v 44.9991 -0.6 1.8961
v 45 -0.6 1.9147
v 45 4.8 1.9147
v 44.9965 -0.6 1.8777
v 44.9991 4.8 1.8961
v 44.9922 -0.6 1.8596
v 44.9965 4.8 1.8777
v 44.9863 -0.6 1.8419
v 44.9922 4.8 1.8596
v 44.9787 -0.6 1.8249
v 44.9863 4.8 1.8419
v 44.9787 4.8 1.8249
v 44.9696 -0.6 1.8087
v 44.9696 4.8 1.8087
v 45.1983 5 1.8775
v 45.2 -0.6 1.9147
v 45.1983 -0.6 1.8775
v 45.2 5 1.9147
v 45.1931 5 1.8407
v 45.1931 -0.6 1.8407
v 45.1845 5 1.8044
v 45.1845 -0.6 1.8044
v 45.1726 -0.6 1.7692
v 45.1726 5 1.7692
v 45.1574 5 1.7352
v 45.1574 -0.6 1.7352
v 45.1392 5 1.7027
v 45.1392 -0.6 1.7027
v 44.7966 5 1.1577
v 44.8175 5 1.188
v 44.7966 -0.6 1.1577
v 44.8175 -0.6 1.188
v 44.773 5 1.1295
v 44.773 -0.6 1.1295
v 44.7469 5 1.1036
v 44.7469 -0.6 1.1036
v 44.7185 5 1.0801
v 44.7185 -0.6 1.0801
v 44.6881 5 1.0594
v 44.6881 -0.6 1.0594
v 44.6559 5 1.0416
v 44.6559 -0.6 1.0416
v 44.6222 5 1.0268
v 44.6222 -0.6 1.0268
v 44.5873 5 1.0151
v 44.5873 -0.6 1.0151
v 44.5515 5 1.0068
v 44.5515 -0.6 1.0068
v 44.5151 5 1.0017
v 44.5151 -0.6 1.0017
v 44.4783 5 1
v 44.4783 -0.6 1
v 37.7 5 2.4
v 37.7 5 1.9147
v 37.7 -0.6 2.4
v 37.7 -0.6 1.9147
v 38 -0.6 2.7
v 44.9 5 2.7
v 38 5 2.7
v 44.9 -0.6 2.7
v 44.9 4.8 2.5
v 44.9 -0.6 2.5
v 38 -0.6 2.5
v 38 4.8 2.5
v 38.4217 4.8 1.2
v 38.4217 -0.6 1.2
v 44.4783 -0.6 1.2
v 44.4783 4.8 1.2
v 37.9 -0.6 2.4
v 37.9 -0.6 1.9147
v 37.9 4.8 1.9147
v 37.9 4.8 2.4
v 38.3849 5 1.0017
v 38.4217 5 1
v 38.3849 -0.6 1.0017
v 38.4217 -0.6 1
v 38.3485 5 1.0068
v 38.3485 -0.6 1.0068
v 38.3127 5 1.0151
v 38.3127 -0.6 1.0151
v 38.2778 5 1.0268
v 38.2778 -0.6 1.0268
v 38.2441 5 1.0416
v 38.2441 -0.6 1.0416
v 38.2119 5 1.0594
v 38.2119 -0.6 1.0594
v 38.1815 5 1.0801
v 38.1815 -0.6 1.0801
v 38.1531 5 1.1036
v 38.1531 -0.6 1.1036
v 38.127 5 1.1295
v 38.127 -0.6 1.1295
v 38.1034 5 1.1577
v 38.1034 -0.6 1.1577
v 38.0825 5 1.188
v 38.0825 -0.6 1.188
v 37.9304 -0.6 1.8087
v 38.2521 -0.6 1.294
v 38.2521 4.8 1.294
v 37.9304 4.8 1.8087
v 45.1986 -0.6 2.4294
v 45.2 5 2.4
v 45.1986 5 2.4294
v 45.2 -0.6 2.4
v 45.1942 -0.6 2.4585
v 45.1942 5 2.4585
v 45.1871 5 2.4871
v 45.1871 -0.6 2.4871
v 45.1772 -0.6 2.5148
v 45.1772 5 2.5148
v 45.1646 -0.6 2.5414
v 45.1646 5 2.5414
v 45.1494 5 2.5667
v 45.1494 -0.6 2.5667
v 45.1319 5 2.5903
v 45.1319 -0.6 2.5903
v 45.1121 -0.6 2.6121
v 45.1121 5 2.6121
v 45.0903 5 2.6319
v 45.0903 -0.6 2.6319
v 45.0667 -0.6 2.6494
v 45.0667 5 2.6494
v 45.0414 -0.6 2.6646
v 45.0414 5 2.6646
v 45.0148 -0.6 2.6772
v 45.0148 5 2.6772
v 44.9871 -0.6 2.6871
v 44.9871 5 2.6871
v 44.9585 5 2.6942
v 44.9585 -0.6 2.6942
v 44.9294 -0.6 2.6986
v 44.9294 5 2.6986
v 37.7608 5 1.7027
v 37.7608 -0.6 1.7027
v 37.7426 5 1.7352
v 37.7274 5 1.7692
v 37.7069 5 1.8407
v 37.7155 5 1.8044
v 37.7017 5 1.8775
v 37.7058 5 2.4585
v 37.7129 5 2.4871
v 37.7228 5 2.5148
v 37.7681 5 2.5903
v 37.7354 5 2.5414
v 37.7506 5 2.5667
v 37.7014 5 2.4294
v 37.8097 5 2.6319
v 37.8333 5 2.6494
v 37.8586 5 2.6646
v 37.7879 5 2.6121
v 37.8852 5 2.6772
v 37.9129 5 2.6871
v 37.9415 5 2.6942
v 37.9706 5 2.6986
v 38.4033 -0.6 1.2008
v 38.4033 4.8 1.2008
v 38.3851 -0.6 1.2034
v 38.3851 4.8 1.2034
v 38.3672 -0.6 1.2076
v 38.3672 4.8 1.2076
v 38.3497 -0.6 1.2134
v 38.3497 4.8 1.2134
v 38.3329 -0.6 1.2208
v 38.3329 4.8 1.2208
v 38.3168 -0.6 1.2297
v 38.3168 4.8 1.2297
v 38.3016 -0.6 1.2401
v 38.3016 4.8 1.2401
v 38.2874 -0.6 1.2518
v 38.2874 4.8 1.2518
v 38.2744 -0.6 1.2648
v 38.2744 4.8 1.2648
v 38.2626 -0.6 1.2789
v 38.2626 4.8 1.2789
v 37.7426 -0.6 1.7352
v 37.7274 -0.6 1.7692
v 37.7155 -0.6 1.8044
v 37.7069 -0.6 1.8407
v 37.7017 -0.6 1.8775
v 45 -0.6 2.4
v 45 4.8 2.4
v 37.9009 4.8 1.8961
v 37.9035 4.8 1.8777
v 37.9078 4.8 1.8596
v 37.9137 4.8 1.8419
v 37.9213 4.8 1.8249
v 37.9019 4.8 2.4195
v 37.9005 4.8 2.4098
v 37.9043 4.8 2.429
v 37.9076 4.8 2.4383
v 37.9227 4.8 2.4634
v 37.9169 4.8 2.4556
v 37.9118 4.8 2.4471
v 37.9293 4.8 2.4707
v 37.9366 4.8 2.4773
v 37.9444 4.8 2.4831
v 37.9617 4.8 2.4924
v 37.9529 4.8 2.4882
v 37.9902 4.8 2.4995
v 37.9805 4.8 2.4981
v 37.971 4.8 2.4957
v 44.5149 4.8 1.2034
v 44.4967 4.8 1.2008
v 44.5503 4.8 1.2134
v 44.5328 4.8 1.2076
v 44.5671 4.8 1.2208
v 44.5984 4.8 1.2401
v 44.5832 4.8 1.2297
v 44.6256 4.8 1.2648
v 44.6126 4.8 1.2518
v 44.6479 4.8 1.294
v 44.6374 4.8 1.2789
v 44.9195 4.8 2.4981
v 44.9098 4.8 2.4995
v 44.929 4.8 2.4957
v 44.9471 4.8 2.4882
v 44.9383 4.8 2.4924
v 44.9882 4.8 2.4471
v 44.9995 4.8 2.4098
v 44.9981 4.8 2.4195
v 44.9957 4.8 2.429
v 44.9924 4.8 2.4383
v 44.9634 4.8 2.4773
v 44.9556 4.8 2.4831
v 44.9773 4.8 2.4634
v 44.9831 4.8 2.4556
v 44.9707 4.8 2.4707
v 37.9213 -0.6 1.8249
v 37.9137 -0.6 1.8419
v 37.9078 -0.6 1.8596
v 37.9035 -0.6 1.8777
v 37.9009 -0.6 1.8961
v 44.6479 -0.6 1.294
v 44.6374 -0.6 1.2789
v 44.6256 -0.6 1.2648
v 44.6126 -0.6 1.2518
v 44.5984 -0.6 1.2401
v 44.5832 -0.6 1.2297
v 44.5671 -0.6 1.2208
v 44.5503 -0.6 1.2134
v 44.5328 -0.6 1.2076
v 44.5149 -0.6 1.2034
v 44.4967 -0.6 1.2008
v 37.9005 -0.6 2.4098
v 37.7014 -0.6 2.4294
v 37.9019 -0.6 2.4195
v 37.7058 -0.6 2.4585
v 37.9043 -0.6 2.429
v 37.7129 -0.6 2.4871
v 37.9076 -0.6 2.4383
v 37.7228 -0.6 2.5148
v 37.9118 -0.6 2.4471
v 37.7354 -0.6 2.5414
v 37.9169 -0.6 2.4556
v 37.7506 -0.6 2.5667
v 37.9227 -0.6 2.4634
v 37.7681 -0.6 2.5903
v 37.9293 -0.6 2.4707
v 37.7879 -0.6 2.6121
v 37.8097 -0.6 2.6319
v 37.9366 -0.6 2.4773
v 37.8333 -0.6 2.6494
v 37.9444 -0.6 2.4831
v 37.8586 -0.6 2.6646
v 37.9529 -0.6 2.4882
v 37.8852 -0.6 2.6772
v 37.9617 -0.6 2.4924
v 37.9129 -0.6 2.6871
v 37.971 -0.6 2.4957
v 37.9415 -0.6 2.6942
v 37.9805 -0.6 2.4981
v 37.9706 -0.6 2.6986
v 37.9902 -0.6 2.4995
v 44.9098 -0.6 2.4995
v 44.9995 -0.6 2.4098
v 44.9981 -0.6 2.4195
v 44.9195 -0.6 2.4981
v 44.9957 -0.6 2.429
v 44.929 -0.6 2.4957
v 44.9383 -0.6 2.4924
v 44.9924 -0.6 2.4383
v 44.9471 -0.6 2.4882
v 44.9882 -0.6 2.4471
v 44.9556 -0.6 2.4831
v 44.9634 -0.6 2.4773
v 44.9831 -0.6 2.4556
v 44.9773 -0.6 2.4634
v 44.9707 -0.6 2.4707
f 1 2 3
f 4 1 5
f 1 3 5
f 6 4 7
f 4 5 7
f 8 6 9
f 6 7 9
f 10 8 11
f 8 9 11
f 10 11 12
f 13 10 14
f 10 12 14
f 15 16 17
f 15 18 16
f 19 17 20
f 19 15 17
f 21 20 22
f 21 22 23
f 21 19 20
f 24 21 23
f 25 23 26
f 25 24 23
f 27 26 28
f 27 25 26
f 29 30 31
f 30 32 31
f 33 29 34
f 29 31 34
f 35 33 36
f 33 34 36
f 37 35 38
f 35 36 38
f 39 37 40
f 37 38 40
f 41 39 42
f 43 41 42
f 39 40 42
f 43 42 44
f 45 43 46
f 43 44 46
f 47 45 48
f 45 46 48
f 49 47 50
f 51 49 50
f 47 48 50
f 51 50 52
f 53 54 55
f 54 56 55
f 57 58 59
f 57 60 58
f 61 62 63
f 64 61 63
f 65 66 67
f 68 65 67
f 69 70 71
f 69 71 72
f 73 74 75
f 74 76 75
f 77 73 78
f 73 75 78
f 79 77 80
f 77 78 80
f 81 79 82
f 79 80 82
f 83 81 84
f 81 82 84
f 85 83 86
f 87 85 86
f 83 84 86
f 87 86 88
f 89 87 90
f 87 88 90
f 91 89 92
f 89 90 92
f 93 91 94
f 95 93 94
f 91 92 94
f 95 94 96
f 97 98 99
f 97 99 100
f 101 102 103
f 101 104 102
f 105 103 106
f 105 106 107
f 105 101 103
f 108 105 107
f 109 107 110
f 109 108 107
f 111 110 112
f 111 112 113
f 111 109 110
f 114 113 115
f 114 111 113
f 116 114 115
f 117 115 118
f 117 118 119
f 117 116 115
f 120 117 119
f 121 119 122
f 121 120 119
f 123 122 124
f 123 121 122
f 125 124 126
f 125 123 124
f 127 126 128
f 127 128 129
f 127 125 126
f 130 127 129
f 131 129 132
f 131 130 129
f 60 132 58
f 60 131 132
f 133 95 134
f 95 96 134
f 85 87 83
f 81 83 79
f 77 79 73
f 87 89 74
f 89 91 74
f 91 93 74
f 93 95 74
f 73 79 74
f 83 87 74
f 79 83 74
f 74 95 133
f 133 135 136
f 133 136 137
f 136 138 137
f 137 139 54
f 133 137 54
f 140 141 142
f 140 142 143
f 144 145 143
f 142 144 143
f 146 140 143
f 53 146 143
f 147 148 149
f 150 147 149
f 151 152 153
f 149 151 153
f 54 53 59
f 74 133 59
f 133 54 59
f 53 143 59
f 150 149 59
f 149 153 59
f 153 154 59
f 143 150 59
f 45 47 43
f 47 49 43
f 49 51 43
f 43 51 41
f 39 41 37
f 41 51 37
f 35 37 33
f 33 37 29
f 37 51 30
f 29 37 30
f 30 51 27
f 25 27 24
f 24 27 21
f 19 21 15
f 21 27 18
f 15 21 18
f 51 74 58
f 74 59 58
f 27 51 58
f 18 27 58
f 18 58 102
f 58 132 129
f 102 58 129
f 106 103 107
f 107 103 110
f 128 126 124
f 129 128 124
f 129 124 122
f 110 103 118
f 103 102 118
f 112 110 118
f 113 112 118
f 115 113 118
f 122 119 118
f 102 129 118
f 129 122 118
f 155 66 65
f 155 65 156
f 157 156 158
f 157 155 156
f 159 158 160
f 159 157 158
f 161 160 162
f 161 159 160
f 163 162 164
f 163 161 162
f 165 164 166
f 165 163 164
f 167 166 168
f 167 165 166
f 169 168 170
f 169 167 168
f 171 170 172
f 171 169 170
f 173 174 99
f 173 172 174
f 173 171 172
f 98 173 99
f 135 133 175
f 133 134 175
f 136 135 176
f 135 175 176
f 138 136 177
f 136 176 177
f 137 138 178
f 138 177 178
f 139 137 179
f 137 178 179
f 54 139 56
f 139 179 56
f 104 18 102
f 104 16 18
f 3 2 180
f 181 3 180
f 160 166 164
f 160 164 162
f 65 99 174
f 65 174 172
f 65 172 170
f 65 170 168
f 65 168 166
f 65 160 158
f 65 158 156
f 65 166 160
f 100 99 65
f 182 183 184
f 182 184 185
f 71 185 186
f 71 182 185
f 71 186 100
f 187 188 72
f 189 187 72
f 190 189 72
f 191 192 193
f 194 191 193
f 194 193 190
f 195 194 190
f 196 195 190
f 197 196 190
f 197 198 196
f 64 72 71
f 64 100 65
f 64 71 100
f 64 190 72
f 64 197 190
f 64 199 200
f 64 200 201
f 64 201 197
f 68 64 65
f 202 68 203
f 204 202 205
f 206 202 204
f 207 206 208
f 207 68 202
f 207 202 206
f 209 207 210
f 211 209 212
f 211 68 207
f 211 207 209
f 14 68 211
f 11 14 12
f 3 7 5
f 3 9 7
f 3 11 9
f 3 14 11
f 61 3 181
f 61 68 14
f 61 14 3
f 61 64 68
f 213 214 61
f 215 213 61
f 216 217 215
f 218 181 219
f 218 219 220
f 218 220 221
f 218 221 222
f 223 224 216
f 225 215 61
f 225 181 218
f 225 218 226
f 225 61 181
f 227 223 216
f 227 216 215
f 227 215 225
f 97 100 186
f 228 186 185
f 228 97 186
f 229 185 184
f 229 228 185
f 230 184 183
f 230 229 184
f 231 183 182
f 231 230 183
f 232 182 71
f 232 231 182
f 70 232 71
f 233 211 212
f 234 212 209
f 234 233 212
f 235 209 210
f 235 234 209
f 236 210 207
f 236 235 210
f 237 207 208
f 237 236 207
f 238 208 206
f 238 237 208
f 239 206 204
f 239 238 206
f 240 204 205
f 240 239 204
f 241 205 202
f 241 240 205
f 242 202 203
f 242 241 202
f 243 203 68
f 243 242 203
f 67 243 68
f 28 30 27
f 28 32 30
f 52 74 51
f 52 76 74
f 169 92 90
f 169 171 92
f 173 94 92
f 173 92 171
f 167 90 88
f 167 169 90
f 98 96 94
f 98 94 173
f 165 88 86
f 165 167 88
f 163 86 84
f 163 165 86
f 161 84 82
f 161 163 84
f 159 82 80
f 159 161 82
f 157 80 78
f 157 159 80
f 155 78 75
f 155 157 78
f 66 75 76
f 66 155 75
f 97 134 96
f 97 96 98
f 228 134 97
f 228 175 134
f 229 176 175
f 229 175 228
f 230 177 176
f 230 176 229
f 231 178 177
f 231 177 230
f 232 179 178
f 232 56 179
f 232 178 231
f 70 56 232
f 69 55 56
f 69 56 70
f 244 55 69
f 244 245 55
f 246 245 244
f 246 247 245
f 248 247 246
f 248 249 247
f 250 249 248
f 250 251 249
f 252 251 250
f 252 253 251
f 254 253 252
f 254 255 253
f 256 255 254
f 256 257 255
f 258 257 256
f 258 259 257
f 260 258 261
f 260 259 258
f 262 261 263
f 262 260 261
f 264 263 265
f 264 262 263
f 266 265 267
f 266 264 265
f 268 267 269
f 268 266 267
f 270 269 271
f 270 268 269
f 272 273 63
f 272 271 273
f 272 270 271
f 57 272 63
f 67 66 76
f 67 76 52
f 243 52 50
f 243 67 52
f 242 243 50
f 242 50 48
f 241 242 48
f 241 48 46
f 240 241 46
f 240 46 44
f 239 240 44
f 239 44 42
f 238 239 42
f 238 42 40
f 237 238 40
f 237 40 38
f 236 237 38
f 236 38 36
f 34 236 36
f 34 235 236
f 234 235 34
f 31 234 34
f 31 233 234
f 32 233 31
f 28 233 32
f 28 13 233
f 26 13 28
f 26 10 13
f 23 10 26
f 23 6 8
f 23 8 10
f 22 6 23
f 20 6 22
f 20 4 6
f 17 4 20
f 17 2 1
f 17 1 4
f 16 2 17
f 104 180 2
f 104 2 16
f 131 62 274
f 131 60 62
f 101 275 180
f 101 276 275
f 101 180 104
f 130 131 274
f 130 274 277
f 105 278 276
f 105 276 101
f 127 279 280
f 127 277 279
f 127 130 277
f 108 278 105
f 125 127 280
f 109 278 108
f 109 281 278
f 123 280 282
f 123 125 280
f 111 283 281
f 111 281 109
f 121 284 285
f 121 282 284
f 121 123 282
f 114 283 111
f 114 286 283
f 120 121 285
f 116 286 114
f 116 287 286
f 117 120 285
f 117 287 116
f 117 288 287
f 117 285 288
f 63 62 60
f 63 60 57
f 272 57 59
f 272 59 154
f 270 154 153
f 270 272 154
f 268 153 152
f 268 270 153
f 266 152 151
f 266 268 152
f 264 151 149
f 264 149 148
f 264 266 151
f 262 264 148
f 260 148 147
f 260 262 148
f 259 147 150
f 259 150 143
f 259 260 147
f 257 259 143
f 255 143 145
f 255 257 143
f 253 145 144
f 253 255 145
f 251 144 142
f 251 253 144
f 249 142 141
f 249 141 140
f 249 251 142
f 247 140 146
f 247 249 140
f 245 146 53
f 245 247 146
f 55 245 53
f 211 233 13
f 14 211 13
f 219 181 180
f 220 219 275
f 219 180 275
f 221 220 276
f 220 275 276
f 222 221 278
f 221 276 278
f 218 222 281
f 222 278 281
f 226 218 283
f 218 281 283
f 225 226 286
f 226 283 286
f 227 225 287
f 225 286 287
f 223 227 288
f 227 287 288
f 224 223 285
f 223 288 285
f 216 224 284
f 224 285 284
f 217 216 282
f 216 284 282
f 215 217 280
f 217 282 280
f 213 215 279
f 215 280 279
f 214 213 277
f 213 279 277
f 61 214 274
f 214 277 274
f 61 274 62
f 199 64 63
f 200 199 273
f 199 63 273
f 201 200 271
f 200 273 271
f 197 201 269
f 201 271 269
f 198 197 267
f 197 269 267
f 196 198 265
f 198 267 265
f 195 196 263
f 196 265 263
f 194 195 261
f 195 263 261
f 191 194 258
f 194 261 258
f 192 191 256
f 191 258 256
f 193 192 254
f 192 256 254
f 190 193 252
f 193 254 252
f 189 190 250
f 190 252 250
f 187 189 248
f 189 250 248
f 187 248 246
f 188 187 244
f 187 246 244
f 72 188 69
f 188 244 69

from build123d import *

# Parameters (mm, degrees)
PAD005_DEPTH      = 0.6
PAD005_DEPTH_BACK = 5
FILLET004_R       = 0.4
THICKNESS_T       = -0.2


with BuildPart() as part:
    # Sketch007 (on Face1 of ReferenceLinearPattern004001) → Pad005 (new body, two sides)
    with BuildSketch(Plane.XZ) as pad005_sk:
        with BuildLine():
            Line((44.9, 2.7), (38, 2.7))
            ThreePointArc((38, 2.7), (37.787868, 2.612132), (37.7, 2.4))
            Line((37.7, 1.8), (37.7, 2.4))
            Line((38.2, 1), (37.7, 1.8))
            Line((38.2, 1), (44.7, 1))
            Line((44.7, 1), (45.2, 1.8))
            Line((45.2, 1.8), (45.2, 2.4))
            ThreePointArc((45.2, 2.4), (45.112132, 2.612132), (44.9, 2.7))
        make_face()
    extrude(amount=PAD005_DEPTH)
    extrude(pad005_sk.sketch, amount=-PAD005_DEPTH_BACK)

    # Fillet004
    fillet004_edges = [part.edges().sort_by_distance(p)[0] for p in [
        (37.7, 2.2, 1.8),
        (38.2, 2.2, 1),
        (45.2, 2.2, 1.8),
        (44.7, 2.2, 1),
    ]]
    fillet(fillet004_edges, radius=FILLET004_R)

    # Thickness
    thickness_openings = [part.faces().sort_by_distance(p)[0] for p in [
        (41.45, -0.6, 1.867545),
    ]]
    offset(amount=THICKNESS_T, openings=thickness_openings)


solid = part.part
